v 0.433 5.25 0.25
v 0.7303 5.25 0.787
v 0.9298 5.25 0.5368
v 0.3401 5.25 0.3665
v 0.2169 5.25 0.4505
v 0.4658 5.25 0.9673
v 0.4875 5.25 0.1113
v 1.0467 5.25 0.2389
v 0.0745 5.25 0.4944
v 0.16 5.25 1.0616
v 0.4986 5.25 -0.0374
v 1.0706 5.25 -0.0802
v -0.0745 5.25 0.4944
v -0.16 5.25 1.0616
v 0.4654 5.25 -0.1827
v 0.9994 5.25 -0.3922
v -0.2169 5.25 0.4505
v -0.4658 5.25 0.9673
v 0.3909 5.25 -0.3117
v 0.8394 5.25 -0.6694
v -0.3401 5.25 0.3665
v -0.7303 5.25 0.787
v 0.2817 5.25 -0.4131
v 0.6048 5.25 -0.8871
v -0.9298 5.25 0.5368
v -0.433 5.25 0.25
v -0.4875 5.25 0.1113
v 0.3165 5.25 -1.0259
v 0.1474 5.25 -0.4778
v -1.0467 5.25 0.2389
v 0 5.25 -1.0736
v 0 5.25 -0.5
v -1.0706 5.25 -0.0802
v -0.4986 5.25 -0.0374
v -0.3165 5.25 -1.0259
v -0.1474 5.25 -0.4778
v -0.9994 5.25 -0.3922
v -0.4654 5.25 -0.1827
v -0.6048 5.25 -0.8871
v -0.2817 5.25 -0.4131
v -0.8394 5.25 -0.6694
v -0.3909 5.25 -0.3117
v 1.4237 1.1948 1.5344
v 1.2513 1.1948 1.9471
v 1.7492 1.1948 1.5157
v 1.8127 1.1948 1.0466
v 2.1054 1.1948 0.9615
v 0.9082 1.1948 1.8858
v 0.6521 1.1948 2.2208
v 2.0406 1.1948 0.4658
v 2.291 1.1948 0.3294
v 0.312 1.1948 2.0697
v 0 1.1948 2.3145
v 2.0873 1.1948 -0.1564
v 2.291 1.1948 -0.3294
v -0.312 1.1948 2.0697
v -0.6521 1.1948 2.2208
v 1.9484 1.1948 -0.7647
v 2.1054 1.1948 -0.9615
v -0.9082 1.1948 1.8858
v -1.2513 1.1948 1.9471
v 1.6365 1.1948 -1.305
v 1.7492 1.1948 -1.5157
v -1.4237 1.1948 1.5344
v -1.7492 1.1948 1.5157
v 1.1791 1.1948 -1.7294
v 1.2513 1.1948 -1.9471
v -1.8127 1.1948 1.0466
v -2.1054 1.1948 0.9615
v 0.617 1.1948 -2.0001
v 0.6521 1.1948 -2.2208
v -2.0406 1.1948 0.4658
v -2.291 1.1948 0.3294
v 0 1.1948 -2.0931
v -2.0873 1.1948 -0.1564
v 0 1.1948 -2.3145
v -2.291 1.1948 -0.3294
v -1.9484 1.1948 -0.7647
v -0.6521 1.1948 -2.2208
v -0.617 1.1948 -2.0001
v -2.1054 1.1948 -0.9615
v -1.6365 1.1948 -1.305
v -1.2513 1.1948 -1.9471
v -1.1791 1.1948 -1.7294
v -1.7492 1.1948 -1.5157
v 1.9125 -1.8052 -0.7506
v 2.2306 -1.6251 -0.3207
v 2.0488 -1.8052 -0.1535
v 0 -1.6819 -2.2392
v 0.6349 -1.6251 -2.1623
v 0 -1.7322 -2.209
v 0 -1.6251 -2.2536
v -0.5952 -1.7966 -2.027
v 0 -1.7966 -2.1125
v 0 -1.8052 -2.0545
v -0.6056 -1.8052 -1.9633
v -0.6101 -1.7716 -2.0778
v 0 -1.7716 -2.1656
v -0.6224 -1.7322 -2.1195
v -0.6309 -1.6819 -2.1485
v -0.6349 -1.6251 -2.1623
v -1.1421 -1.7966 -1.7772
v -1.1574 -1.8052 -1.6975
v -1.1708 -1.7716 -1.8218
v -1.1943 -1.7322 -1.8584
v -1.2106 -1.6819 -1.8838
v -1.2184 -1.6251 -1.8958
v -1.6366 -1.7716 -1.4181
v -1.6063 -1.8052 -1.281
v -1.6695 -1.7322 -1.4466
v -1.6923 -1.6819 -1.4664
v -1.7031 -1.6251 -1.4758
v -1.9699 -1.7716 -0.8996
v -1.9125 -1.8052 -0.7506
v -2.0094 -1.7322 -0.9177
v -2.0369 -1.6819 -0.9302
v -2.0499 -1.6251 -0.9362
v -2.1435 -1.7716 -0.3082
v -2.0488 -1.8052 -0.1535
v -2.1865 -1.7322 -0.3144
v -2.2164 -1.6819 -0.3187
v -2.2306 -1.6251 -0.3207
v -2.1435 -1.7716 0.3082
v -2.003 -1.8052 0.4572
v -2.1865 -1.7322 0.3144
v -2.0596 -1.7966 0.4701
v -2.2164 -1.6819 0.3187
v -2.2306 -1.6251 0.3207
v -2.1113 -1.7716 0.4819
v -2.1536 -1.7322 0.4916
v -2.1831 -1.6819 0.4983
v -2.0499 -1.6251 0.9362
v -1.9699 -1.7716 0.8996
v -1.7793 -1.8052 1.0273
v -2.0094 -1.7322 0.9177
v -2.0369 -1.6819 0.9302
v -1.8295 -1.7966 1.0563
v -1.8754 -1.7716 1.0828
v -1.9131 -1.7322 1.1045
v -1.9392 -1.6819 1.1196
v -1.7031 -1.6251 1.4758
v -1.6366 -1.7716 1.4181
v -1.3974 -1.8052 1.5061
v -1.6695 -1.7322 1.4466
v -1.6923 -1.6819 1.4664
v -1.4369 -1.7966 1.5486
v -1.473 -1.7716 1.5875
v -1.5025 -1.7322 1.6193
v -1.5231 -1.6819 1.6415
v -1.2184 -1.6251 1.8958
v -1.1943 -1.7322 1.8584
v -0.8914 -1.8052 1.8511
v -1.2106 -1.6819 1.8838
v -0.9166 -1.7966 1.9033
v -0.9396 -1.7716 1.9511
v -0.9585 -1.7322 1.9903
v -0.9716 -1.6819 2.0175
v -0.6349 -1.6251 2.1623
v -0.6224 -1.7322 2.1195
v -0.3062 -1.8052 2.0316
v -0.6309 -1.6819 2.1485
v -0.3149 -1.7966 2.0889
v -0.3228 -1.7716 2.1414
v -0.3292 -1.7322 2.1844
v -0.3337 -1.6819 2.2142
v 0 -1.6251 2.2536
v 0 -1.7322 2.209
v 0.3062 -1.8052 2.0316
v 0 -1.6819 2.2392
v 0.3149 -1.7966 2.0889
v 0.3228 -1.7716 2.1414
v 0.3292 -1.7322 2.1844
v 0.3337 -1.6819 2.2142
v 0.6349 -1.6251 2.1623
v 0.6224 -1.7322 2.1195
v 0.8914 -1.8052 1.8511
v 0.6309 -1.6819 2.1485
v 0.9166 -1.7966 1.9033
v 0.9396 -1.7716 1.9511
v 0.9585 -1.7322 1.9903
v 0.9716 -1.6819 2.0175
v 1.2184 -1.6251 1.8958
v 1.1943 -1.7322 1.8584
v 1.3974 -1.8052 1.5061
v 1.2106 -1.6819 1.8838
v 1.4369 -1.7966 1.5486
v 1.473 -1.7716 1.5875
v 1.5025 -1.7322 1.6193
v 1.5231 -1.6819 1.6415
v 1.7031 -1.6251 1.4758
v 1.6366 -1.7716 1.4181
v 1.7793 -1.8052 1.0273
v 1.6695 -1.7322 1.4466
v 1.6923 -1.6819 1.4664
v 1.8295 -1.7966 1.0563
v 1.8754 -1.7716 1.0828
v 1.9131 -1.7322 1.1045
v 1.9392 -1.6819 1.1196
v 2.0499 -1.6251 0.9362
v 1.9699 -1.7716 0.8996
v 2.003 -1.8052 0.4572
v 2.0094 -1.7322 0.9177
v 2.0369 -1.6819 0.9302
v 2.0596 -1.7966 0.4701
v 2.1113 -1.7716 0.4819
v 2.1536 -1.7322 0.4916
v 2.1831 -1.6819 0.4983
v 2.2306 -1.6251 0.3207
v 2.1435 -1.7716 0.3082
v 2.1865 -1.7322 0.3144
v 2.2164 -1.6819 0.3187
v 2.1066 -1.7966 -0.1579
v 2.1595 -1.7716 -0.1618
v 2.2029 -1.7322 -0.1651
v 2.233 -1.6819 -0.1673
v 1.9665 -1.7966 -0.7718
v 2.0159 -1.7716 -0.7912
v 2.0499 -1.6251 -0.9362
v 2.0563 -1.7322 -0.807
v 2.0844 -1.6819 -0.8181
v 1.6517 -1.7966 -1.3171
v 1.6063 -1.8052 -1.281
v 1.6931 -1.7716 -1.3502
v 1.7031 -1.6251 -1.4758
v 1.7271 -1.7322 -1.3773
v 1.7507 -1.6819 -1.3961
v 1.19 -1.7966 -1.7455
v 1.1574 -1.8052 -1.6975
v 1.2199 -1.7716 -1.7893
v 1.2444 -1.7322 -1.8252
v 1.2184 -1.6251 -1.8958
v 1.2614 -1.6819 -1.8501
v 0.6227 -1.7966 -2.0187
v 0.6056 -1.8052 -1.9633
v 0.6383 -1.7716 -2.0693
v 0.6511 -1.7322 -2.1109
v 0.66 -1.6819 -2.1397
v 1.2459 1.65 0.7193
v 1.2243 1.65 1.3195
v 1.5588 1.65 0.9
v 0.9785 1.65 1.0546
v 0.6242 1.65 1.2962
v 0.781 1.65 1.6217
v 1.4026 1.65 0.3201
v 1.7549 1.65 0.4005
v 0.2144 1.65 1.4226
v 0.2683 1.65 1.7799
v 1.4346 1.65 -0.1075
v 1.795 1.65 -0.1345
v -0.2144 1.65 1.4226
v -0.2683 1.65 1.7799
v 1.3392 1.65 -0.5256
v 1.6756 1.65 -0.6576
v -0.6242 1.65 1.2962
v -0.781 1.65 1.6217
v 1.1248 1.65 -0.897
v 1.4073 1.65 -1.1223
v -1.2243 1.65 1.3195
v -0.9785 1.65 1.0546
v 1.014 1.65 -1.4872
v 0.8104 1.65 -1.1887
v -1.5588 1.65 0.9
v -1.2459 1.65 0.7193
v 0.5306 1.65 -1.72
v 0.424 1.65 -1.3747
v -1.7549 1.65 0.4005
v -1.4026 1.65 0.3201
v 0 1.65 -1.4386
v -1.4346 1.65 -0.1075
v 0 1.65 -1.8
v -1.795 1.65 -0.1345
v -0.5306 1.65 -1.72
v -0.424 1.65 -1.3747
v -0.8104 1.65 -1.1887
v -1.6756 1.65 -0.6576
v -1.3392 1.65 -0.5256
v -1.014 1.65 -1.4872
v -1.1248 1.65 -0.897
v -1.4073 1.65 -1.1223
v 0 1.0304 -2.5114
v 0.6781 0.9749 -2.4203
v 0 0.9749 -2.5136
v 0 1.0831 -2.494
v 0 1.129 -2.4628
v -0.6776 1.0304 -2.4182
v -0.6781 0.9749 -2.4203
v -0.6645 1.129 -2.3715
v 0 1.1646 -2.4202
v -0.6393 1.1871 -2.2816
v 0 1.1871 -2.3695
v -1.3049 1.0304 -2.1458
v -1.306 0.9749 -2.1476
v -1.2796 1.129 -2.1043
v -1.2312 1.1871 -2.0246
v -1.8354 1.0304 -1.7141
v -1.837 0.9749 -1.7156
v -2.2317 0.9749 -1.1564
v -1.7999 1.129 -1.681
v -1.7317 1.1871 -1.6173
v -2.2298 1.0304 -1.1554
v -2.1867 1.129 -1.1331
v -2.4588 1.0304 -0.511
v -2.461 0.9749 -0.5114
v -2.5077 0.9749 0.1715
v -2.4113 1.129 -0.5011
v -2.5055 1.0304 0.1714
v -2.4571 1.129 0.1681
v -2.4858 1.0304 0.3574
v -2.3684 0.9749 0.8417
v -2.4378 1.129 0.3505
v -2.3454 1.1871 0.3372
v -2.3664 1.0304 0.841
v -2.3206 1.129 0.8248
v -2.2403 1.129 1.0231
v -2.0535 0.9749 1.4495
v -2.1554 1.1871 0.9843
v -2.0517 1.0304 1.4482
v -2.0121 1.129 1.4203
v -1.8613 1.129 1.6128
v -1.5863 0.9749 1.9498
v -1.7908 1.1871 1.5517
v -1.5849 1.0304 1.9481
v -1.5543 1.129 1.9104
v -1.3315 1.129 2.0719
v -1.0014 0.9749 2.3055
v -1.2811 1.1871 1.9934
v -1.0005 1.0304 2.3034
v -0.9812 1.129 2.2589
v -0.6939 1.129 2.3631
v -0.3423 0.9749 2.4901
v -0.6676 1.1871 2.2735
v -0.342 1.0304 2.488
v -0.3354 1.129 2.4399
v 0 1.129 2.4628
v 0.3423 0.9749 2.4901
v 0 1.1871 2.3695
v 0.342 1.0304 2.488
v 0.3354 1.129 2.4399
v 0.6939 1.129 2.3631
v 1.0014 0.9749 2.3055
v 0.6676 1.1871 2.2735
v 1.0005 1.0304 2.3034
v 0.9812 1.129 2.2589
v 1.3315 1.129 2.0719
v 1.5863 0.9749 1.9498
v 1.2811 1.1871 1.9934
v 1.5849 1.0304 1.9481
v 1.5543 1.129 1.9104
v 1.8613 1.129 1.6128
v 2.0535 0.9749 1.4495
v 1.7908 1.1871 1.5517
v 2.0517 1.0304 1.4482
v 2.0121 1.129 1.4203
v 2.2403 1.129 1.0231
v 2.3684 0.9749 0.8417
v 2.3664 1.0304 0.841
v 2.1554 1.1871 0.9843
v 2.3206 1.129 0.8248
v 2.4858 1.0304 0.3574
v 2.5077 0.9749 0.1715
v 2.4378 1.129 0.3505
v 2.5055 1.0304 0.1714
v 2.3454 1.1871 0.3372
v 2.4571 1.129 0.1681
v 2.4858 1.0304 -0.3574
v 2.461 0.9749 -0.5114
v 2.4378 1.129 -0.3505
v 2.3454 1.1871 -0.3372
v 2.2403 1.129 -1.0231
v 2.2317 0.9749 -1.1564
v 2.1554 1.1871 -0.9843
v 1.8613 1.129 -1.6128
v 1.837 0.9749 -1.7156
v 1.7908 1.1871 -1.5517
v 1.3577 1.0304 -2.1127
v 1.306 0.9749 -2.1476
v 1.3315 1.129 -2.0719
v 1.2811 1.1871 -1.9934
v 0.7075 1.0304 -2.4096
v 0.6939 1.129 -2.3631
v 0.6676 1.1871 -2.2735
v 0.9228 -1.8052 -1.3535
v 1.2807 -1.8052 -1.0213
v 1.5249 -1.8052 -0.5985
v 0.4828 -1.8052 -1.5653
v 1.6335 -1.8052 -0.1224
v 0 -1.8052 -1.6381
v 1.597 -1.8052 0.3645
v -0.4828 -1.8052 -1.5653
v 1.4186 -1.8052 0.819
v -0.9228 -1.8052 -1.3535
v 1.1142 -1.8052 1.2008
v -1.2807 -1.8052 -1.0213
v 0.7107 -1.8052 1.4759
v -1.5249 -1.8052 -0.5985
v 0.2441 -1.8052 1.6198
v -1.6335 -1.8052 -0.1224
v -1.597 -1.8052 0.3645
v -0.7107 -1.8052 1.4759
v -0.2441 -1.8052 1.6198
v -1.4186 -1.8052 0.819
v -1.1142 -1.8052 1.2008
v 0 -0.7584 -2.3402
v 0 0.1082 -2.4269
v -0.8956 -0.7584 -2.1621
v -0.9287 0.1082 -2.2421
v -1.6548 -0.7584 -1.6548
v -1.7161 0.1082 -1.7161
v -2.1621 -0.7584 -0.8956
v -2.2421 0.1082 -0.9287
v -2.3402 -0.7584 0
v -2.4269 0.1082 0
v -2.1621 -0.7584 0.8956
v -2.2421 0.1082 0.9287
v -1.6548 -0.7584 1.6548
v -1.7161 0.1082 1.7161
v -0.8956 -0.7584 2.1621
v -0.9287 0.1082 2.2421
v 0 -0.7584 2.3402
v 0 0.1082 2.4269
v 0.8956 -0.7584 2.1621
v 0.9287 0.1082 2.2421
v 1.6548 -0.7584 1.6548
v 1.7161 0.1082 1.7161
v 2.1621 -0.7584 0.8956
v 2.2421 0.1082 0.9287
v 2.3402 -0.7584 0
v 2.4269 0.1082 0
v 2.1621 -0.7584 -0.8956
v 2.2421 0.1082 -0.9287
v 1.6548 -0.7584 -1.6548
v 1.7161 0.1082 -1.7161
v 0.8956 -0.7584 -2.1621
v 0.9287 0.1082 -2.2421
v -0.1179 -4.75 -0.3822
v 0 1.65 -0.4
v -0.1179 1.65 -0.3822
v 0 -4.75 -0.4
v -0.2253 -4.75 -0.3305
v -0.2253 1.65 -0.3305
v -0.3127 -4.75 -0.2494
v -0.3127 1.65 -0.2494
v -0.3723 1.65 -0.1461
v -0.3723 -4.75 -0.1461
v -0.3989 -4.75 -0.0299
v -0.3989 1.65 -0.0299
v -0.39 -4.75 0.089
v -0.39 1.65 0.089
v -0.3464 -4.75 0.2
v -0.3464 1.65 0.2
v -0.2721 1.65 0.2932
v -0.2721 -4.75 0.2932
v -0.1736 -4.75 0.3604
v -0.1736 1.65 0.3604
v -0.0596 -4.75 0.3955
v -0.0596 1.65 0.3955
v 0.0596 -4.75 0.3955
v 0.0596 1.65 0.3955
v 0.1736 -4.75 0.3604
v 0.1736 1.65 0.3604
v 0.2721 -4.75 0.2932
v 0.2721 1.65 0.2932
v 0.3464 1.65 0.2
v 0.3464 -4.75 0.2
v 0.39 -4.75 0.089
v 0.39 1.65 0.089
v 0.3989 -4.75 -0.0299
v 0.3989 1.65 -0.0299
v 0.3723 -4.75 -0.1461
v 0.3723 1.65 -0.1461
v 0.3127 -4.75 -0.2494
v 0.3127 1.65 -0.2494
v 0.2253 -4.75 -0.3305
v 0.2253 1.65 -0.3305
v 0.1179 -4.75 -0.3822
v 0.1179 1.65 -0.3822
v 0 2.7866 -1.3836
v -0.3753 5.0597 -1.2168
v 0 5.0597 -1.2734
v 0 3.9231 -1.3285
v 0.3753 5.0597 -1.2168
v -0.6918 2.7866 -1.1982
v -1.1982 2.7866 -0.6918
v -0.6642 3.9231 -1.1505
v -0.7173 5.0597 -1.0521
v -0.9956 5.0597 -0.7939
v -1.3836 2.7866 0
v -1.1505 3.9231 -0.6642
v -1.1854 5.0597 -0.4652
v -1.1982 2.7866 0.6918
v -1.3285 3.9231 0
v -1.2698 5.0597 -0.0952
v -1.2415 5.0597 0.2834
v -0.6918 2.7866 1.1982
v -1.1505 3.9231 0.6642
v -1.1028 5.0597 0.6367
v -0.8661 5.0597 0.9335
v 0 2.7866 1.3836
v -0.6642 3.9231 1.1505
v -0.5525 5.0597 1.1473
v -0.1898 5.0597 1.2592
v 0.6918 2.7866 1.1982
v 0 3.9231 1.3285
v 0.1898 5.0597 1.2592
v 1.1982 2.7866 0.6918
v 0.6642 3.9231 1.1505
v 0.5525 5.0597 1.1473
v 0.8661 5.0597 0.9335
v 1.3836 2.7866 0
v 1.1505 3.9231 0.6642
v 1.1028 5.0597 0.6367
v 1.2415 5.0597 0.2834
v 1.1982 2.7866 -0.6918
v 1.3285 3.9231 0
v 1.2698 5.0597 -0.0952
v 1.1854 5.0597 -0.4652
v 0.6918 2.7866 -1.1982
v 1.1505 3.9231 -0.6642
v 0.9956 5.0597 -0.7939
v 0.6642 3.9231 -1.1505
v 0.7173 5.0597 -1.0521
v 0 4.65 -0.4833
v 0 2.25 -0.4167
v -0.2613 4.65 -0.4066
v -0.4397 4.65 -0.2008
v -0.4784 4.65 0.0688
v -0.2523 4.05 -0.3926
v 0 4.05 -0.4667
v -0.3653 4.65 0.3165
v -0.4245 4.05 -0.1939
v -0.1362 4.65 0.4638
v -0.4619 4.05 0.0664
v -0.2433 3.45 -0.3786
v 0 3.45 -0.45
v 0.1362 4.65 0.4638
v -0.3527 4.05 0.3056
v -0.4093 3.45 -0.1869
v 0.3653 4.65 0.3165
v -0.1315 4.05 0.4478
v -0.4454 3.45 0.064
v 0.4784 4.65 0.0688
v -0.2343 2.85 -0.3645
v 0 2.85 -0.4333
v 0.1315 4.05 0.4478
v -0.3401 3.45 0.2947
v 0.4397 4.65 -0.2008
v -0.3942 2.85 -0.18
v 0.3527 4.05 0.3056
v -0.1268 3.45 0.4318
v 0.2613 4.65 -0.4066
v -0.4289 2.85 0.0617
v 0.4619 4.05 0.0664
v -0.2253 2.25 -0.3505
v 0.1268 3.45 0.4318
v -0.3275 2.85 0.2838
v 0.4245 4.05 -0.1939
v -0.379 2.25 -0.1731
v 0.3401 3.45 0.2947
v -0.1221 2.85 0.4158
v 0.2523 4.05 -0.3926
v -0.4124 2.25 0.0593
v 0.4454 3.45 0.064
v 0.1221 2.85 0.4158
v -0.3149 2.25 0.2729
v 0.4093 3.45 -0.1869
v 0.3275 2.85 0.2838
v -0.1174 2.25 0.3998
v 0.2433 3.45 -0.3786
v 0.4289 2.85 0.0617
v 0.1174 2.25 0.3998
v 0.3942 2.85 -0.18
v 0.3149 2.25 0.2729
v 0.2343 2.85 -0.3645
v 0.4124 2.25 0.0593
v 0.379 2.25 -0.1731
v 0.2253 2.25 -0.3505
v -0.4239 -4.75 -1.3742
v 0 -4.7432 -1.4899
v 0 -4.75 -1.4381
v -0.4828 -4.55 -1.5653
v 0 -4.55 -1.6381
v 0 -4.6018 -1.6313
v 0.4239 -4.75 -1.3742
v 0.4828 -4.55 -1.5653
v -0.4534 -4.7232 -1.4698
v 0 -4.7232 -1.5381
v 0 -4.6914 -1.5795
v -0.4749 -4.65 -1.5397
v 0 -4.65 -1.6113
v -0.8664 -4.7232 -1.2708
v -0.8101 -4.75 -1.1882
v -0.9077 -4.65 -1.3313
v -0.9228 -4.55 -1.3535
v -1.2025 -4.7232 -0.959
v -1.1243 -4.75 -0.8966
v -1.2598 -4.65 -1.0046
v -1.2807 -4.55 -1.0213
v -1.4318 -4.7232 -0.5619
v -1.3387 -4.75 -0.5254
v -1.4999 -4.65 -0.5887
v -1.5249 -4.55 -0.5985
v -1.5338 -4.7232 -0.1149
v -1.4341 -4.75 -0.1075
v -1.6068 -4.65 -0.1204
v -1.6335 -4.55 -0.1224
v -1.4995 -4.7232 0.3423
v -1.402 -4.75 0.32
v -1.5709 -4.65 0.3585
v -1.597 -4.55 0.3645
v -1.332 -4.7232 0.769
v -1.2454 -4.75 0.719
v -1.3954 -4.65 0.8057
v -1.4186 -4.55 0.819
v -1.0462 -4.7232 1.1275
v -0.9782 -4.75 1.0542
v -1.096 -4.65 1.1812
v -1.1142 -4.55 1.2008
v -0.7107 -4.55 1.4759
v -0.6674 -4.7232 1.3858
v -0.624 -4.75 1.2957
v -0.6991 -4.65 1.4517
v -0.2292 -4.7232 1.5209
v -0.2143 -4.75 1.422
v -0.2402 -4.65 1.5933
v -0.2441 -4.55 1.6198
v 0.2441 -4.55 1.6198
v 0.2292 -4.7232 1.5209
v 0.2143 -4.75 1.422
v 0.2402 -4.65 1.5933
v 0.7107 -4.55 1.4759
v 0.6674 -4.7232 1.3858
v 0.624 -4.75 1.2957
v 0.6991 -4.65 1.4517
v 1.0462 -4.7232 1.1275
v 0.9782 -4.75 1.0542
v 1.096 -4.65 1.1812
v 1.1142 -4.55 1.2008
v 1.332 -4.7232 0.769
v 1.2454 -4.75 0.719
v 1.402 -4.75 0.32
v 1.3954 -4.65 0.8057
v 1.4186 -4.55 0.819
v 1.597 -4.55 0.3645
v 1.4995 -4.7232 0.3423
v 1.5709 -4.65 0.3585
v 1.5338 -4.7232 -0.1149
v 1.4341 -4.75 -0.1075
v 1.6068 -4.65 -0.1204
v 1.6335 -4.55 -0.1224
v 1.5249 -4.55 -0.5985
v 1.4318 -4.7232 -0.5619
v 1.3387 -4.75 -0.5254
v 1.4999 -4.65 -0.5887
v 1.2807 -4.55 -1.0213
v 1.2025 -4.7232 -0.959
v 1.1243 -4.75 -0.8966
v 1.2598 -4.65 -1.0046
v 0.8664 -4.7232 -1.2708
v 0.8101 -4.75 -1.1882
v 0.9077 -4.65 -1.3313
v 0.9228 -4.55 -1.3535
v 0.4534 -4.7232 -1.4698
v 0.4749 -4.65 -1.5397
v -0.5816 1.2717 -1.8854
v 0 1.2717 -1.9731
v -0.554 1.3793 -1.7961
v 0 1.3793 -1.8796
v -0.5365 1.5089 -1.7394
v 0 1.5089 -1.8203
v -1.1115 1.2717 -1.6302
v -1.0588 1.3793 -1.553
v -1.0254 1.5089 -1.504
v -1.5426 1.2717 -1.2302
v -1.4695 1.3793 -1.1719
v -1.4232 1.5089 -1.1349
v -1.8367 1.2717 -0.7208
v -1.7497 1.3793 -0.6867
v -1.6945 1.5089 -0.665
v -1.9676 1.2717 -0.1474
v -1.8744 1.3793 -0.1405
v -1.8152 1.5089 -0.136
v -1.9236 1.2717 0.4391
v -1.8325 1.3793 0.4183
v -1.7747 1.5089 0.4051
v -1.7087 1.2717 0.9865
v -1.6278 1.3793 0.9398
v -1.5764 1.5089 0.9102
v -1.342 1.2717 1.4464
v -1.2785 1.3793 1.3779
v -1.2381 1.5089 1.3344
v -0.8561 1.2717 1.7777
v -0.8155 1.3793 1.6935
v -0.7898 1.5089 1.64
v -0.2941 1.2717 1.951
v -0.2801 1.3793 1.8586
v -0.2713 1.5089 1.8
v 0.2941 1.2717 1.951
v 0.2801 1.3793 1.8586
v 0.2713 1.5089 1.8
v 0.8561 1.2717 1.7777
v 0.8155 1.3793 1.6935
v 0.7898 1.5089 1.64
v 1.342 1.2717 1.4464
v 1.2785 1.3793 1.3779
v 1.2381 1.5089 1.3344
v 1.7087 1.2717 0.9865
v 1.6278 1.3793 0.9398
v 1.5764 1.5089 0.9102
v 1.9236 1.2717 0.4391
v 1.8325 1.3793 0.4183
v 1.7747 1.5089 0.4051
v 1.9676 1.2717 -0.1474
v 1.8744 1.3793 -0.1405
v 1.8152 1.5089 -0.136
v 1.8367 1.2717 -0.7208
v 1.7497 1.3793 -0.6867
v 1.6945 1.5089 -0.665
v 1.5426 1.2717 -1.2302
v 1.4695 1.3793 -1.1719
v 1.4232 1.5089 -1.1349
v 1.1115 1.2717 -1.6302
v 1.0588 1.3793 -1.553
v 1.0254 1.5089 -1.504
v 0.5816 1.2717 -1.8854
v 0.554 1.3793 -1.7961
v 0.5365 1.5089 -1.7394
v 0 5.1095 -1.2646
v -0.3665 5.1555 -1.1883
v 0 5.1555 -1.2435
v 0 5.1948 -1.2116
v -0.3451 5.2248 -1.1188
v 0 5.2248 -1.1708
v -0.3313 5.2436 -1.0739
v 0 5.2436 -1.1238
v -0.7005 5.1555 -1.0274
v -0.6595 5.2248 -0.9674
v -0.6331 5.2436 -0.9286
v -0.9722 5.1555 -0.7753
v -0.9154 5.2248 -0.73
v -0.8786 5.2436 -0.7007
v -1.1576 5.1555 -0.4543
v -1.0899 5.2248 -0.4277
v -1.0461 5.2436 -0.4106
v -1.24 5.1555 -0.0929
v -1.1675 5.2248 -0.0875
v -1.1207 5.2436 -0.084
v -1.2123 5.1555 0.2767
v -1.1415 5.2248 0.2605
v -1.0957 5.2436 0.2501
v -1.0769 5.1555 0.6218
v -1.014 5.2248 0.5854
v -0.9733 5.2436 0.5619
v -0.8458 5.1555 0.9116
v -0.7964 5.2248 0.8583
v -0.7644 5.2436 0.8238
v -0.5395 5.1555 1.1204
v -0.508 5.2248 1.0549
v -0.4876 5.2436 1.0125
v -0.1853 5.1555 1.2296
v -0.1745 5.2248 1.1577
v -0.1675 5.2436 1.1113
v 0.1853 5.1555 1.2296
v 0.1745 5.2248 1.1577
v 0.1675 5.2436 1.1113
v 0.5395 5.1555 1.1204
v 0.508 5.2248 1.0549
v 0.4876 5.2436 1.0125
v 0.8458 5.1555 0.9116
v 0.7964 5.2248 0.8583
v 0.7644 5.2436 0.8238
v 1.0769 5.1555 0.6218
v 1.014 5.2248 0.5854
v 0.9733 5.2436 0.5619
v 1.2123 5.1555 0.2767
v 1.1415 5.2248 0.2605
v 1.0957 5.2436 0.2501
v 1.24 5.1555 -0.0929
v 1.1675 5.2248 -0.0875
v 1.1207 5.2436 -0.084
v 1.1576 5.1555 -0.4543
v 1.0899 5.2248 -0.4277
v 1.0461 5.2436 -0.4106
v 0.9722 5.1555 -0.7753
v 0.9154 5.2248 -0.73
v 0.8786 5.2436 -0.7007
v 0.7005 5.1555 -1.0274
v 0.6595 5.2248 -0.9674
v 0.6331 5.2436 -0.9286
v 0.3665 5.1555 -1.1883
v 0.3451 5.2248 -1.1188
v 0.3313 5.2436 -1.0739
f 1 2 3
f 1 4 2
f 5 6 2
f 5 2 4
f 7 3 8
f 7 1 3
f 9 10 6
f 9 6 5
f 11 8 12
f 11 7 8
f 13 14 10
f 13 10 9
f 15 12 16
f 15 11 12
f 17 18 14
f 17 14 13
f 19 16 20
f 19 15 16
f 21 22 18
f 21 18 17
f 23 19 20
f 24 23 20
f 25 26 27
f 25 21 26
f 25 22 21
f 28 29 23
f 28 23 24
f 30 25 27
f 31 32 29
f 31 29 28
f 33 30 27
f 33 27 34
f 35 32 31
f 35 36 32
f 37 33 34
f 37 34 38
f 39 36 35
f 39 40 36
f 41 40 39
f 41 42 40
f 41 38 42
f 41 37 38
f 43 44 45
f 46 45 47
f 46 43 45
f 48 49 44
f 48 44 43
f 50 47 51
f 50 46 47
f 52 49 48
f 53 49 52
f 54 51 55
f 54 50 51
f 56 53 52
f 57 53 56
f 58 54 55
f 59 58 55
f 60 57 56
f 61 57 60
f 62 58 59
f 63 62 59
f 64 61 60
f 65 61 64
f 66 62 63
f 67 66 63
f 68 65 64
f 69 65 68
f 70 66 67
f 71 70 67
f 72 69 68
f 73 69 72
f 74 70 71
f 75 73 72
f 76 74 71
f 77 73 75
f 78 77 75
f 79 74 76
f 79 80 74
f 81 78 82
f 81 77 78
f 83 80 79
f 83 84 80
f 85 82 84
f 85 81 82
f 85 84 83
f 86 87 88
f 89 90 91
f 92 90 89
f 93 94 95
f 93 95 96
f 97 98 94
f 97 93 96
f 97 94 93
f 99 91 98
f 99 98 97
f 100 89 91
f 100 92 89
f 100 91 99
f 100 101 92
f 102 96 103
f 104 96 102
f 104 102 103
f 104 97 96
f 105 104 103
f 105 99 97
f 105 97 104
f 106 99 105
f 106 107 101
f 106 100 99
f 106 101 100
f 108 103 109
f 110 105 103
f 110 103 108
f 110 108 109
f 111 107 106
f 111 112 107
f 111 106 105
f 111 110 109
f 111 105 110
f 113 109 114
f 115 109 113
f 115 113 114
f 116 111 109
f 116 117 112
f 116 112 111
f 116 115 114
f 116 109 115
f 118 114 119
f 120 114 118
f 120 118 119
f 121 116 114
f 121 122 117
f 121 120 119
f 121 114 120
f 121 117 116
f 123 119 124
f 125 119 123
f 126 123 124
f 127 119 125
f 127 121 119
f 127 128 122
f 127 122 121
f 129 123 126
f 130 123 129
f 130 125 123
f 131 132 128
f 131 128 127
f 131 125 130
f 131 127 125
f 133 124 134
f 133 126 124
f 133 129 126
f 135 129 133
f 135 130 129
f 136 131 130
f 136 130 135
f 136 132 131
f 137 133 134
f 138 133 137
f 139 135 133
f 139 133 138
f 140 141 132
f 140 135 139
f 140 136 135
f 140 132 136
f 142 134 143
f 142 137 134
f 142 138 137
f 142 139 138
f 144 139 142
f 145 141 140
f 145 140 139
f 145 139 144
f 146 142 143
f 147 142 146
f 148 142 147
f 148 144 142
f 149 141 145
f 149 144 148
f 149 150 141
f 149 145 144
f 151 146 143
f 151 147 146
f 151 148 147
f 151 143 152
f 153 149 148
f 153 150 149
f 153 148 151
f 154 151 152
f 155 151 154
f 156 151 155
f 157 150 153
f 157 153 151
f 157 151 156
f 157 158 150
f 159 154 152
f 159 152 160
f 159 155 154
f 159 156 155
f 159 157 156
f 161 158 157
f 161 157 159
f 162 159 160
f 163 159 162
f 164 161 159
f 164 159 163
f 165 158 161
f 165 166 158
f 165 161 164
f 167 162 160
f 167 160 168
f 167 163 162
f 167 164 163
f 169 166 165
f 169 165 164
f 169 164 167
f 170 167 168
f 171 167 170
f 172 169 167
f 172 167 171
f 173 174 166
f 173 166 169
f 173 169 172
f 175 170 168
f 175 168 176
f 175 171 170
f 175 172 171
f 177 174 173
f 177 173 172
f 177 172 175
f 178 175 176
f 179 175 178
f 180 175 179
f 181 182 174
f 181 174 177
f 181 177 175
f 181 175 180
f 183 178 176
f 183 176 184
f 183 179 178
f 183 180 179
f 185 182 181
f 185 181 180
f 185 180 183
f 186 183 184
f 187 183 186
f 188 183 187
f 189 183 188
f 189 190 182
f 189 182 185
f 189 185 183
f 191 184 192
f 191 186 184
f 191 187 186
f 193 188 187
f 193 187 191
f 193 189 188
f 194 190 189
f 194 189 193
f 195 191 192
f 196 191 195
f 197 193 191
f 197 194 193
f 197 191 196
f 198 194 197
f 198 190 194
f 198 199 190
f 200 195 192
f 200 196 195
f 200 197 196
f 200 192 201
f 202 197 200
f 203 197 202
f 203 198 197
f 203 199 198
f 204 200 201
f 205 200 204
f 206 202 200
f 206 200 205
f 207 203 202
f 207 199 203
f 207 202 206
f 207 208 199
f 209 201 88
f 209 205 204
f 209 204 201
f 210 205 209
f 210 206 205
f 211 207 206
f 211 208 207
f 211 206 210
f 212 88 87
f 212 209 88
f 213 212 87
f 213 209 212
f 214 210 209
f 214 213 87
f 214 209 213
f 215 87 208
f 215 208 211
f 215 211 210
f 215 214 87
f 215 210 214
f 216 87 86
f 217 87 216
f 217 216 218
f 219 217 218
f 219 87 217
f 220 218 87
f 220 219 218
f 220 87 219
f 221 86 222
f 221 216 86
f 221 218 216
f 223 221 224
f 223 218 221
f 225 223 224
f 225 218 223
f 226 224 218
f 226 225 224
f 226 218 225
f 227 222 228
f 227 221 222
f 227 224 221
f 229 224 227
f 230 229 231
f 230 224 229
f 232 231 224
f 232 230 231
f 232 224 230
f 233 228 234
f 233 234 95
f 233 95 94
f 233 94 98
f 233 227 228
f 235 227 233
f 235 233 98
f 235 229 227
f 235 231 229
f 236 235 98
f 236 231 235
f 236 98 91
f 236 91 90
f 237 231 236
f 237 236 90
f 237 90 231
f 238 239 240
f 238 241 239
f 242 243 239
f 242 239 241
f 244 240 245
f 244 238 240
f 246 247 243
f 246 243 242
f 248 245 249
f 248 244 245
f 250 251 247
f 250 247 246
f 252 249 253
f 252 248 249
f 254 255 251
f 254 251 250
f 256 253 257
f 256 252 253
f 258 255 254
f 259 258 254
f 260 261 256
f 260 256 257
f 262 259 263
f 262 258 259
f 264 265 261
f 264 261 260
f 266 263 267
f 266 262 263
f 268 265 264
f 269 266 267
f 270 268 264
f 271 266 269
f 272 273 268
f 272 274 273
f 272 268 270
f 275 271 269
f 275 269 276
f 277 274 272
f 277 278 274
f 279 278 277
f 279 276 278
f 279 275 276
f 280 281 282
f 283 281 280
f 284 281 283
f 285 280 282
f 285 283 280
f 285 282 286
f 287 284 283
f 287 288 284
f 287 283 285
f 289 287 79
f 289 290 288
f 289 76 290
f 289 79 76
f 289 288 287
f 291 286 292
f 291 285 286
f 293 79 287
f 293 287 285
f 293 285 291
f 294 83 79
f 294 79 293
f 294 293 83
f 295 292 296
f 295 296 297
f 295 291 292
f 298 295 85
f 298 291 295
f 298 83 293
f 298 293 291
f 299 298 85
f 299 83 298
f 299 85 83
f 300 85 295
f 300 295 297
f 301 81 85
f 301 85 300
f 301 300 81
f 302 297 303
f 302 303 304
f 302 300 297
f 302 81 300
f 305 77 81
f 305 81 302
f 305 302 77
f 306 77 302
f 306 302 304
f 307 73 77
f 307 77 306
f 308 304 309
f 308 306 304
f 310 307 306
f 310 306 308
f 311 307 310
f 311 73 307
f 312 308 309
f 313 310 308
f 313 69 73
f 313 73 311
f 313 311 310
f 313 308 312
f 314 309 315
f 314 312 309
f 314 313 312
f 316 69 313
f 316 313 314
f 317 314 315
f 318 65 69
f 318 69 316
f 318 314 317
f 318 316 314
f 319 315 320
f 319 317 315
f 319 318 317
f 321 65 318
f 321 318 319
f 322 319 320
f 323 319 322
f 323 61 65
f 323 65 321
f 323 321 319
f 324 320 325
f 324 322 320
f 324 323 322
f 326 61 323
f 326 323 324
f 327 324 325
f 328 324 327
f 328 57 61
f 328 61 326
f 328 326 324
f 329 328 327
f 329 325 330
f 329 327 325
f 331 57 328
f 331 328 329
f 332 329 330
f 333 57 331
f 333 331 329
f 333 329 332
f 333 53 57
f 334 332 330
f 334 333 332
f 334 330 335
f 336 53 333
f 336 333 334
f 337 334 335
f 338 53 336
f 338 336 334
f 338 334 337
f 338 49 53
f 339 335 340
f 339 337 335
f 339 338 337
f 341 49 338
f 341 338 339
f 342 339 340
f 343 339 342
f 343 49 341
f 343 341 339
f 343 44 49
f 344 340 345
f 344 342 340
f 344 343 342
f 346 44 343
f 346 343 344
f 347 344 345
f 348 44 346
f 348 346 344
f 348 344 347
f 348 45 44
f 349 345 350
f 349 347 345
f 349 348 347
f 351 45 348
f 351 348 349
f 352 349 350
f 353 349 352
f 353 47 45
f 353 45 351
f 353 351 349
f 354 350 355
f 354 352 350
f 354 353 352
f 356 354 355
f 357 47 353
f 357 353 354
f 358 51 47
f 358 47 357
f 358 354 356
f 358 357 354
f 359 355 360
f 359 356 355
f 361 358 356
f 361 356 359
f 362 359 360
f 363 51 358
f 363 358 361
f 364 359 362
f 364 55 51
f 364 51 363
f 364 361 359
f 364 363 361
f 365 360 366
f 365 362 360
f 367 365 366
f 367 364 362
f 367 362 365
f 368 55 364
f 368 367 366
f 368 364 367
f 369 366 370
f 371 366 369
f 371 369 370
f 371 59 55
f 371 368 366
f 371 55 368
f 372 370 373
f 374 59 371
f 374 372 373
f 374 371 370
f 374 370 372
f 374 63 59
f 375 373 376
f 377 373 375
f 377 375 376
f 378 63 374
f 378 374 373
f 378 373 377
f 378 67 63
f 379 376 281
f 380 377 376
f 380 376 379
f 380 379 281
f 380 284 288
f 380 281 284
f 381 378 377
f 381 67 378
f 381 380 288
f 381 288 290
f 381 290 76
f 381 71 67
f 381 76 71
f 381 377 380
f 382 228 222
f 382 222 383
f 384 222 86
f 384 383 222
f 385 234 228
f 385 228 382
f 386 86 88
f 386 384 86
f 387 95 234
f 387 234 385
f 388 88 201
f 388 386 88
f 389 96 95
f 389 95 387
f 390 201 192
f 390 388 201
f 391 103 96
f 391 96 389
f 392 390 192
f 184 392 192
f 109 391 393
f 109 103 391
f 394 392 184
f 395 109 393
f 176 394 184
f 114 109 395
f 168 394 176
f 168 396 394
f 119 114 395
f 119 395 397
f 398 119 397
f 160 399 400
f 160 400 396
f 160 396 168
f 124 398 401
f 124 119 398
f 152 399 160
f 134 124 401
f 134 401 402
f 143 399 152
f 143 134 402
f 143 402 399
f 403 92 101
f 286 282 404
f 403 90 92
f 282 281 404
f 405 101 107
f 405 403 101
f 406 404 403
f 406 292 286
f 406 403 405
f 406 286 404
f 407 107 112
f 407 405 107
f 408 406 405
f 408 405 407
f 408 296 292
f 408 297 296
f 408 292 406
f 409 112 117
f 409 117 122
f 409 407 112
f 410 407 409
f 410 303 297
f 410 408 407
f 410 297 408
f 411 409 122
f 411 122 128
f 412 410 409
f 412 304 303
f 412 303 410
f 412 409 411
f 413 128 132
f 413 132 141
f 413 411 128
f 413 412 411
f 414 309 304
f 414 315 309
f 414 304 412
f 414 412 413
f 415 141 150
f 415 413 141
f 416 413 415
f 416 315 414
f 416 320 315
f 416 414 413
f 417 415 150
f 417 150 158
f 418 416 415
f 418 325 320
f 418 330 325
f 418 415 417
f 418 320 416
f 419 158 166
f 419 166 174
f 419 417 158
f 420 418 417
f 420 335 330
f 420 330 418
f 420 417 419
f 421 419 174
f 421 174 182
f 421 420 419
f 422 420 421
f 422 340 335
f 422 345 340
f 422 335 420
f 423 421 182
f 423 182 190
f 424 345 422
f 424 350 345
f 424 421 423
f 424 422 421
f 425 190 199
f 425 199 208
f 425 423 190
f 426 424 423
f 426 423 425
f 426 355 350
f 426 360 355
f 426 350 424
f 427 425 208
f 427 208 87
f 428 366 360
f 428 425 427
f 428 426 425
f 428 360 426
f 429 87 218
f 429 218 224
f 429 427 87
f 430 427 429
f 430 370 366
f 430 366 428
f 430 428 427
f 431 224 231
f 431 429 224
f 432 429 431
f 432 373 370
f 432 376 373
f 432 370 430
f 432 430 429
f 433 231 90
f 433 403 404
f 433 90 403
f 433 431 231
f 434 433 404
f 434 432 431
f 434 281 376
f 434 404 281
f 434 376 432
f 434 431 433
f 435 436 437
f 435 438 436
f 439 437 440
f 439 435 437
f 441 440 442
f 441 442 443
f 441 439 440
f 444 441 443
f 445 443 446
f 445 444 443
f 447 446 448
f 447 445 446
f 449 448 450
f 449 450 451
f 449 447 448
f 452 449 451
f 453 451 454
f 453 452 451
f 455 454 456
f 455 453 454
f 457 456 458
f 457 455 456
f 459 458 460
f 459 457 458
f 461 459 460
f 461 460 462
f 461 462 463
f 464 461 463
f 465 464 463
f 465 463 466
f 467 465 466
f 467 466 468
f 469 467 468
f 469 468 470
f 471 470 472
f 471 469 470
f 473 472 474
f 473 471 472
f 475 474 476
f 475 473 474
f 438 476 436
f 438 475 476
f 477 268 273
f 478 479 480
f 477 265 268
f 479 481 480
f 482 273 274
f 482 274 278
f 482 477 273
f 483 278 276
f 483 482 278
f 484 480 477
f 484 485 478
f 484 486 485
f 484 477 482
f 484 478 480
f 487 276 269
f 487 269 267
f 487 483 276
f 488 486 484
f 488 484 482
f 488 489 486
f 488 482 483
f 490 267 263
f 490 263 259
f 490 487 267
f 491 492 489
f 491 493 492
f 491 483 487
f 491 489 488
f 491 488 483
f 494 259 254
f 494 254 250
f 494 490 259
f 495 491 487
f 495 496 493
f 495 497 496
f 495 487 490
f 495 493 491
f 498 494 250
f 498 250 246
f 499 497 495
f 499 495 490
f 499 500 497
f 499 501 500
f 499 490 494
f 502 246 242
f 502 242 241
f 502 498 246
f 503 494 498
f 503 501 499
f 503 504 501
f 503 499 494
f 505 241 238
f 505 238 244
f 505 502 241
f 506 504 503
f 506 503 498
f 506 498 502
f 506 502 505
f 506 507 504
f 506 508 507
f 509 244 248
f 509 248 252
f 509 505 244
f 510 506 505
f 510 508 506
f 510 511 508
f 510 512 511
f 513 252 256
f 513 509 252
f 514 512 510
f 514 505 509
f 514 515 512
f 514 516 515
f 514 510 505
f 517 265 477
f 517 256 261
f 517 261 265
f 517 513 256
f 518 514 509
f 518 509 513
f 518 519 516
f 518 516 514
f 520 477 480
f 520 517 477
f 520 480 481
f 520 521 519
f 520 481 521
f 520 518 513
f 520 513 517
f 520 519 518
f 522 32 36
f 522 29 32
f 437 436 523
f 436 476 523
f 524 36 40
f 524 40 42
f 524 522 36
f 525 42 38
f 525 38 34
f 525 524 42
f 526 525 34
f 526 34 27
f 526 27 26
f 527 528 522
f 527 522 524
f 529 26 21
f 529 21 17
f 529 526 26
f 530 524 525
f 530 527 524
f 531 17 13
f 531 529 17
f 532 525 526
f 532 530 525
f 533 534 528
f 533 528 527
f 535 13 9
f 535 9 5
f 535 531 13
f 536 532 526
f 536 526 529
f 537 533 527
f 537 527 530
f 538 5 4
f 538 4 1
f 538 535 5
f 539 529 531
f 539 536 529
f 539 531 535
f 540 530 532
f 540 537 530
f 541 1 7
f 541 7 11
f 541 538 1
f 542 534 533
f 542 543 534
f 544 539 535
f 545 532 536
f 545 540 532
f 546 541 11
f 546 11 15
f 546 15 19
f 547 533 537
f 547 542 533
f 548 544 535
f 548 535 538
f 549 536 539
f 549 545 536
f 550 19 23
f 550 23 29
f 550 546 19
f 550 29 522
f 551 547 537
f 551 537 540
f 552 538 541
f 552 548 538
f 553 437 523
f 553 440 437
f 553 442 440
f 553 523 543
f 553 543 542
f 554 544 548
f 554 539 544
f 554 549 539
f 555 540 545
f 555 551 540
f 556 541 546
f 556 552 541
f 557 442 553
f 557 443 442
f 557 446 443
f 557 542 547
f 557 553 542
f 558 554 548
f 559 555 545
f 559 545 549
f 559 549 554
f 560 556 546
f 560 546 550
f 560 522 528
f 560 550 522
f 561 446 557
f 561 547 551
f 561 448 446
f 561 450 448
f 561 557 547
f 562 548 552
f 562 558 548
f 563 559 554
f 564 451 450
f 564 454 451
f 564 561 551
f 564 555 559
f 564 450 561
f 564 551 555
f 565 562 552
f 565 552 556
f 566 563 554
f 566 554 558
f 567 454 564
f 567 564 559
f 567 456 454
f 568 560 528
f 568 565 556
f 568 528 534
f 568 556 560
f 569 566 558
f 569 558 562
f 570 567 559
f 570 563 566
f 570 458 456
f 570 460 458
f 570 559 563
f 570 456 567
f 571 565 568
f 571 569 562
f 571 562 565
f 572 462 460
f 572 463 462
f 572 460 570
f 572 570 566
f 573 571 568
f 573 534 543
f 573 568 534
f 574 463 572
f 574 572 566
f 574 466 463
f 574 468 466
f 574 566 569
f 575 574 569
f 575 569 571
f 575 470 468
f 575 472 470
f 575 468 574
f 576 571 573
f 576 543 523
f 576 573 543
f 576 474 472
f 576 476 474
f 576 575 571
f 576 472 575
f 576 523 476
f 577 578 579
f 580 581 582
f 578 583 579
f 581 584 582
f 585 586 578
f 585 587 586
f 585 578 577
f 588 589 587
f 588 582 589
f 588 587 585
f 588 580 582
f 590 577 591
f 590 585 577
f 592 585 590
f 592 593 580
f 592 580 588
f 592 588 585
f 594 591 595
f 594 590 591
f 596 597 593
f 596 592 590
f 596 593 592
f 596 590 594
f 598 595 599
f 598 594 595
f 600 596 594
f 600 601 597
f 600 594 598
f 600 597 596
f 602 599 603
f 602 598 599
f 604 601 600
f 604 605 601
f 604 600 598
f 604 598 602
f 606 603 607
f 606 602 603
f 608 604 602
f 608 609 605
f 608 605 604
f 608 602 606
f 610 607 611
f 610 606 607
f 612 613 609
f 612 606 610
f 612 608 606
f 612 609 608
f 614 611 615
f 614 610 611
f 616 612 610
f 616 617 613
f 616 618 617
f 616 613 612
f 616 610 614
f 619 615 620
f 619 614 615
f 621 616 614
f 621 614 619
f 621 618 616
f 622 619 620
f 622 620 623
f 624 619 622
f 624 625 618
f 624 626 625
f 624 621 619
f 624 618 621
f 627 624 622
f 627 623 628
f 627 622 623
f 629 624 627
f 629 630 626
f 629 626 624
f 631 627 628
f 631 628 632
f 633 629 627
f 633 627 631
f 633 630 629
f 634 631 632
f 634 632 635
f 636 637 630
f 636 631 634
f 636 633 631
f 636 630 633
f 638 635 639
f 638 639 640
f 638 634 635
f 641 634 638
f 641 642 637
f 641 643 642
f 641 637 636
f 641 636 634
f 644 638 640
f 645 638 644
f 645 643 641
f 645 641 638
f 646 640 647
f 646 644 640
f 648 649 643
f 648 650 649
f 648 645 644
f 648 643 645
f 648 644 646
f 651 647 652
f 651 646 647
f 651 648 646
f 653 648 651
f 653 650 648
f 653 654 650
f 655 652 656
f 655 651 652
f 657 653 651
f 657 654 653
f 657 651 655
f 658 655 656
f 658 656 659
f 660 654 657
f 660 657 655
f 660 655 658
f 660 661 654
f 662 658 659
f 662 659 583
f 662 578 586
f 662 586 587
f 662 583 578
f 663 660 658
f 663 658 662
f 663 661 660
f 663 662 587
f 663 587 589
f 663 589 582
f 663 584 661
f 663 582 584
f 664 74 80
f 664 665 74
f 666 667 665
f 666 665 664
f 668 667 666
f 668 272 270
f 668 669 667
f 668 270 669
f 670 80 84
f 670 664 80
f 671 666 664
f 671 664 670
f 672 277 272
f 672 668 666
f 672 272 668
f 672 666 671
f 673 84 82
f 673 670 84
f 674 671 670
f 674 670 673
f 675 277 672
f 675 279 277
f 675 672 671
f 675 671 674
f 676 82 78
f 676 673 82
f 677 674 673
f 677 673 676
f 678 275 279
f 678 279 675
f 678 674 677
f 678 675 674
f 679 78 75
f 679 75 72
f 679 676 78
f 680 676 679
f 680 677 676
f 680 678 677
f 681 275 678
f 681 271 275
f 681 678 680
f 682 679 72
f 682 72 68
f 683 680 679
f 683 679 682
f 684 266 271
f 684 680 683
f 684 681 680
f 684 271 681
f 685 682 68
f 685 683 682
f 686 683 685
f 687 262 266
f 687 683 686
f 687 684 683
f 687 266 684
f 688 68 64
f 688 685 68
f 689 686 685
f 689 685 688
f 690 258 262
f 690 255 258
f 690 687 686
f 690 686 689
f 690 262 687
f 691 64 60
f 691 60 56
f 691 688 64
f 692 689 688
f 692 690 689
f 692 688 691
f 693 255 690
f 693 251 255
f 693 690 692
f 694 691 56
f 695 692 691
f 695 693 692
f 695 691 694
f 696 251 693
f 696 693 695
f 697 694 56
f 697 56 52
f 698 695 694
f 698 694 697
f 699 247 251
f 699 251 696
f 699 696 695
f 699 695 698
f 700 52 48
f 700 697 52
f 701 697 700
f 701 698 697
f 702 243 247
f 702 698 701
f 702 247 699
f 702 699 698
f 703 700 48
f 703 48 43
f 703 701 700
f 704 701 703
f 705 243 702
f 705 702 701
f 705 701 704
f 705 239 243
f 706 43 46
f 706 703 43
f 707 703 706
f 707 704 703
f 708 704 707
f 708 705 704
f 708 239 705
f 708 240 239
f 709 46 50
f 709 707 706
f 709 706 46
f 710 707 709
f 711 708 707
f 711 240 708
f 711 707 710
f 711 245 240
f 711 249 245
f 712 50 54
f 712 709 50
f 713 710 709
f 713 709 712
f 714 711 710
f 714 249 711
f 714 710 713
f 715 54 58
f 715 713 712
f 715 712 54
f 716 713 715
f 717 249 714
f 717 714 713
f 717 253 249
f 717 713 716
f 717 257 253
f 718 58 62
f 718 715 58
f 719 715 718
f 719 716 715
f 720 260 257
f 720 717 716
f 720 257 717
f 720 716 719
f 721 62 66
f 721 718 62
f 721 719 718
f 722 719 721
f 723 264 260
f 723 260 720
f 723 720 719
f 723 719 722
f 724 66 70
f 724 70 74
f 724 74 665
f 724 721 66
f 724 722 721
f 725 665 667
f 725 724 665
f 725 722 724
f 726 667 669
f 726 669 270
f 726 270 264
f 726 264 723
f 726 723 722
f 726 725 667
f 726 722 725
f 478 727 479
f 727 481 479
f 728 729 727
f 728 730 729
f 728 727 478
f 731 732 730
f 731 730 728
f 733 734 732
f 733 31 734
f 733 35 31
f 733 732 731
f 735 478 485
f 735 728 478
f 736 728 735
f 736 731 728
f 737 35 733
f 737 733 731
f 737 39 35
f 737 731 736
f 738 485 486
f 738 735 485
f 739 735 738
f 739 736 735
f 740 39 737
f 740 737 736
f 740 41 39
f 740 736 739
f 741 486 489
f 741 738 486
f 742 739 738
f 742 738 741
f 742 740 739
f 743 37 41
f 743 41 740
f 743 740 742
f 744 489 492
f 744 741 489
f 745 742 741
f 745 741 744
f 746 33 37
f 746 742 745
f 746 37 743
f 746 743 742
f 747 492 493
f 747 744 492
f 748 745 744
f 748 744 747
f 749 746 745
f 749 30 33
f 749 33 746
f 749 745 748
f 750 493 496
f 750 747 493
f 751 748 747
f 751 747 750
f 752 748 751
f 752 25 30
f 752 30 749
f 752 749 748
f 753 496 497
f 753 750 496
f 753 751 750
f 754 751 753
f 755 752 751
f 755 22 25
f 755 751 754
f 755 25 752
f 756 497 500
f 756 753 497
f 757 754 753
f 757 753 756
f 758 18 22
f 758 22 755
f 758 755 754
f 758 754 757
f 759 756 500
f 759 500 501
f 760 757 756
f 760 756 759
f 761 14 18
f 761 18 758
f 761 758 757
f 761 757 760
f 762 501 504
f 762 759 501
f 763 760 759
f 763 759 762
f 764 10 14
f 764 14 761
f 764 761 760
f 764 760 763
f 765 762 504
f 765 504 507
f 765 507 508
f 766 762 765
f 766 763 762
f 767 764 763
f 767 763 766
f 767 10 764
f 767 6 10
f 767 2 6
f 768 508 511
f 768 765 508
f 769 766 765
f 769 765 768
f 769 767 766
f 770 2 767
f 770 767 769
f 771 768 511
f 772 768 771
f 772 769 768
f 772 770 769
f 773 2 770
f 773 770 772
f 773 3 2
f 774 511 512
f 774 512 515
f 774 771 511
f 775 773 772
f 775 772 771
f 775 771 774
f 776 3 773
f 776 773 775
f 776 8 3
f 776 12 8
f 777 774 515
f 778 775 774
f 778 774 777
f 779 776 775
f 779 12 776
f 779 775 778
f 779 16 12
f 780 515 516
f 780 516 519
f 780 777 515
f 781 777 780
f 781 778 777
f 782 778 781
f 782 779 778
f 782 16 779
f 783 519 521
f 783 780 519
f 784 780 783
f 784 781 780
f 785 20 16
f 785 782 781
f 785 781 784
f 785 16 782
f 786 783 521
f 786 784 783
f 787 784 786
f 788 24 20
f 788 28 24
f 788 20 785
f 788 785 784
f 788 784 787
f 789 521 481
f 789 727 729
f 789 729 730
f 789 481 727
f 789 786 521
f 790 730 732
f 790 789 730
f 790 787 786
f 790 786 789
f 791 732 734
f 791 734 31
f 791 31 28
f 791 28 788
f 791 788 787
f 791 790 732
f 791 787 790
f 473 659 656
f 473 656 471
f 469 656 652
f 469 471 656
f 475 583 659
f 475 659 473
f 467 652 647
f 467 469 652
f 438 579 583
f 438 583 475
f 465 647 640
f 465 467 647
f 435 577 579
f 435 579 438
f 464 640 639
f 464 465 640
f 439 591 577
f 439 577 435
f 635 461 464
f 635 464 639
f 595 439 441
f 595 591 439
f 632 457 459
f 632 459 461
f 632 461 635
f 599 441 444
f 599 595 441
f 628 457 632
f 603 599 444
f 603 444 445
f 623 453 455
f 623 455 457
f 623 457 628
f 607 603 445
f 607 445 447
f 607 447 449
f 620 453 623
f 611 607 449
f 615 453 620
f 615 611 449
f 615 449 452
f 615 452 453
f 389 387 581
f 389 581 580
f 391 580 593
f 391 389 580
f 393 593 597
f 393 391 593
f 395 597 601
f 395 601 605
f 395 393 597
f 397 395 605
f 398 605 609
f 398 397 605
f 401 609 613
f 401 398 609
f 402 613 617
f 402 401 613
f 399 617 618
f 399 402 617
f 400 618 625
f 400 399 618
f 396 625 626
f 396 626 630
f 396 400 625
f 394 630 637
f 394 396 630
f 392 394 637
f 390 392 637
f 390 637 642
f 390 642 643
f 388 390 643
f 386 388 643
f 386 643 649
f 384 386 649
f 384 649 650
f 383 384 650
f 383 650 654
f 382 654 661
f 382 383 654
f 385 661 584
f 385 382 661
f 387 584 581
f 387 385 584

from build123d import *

# Parameters (mm, degrees)
FILLET1_R = 0.2
FILLET2_R = 0.2
FILLET3_R = 0.2


with BuildPart() as part:
    # Sketch2 → Revolve1 (revolve)
    with BuildSketch(Plane.XY, mode=Mode.PRIVATE) as revolve1_sk:
        with BuildLine():
            Line((-0.4, -4.75), (-1.638095238, -4.75))
            Line((-1.638095238, -4.75), (-1.638095238, -1.805191747))
            Line((-1.638095238, -1.805191747), (-2.235540304, -1.805191747))
            Line((-2.235540304, -1.805191747), (-2.535540304, 1.194808253))
            Line((-2.535540304, 1.194808253), (-2.093117248, 1.194808253))
            ThreePointArc((-2.093117248, 1.194808253), (-1.879618402, 1.379298482), (-1.8, 1.65))
            Line((-1.8, 1.65), (-1.438630681, 1.65))
            Line((-1.438630681, 1.65), (-1.264172597, 5.25))
            Line((-1.264172597, 5.25), (-0.5, 5.25))
            Line((-0.5, 5.25), (-0.4, 1.65))
            Line((-0.4, 1.65), (-0.4, 1.194808253))
            Line((-0.4, 1.194808253), (-0.4, -1.805191747))
            Line((-0.4, -1.805191747), (-0.4, -4.75))
        make_face()
    revolve(revolve1_sk.sketch.rotate(Axis((0, -5.25, 0), (0, 1, 0)), 270), axis=Axis((0, -5.25, 0), (0, 1, 0)))

    # Fillet1
    fillet1_edges = [part.edges().sort_by_distance(p)[0] for p in [
        (0, 5.25, 1.264172597),
    ]]
    fillet(fillet1_edges, radius=FILLET1_R)

    # Fillet2
    fillet2_edges = [part.edges().sort_by_distance(p)[0] for p in [
        (0, -4.75, 1.638095238),
    ]]
    fillet(fillet2_edges, radius=FILLET2_R)

    # Fillet3
    fillet3_edges = [part.edges().sort_by_distance(p)[0] for p in [
        (0, -1.805191747, 2.235540304),
        (0, 1.194808253, 2.535540304),
    ]]
    fillet(fillet3_edges, radius=FILLET3_R)


solid = part.part
